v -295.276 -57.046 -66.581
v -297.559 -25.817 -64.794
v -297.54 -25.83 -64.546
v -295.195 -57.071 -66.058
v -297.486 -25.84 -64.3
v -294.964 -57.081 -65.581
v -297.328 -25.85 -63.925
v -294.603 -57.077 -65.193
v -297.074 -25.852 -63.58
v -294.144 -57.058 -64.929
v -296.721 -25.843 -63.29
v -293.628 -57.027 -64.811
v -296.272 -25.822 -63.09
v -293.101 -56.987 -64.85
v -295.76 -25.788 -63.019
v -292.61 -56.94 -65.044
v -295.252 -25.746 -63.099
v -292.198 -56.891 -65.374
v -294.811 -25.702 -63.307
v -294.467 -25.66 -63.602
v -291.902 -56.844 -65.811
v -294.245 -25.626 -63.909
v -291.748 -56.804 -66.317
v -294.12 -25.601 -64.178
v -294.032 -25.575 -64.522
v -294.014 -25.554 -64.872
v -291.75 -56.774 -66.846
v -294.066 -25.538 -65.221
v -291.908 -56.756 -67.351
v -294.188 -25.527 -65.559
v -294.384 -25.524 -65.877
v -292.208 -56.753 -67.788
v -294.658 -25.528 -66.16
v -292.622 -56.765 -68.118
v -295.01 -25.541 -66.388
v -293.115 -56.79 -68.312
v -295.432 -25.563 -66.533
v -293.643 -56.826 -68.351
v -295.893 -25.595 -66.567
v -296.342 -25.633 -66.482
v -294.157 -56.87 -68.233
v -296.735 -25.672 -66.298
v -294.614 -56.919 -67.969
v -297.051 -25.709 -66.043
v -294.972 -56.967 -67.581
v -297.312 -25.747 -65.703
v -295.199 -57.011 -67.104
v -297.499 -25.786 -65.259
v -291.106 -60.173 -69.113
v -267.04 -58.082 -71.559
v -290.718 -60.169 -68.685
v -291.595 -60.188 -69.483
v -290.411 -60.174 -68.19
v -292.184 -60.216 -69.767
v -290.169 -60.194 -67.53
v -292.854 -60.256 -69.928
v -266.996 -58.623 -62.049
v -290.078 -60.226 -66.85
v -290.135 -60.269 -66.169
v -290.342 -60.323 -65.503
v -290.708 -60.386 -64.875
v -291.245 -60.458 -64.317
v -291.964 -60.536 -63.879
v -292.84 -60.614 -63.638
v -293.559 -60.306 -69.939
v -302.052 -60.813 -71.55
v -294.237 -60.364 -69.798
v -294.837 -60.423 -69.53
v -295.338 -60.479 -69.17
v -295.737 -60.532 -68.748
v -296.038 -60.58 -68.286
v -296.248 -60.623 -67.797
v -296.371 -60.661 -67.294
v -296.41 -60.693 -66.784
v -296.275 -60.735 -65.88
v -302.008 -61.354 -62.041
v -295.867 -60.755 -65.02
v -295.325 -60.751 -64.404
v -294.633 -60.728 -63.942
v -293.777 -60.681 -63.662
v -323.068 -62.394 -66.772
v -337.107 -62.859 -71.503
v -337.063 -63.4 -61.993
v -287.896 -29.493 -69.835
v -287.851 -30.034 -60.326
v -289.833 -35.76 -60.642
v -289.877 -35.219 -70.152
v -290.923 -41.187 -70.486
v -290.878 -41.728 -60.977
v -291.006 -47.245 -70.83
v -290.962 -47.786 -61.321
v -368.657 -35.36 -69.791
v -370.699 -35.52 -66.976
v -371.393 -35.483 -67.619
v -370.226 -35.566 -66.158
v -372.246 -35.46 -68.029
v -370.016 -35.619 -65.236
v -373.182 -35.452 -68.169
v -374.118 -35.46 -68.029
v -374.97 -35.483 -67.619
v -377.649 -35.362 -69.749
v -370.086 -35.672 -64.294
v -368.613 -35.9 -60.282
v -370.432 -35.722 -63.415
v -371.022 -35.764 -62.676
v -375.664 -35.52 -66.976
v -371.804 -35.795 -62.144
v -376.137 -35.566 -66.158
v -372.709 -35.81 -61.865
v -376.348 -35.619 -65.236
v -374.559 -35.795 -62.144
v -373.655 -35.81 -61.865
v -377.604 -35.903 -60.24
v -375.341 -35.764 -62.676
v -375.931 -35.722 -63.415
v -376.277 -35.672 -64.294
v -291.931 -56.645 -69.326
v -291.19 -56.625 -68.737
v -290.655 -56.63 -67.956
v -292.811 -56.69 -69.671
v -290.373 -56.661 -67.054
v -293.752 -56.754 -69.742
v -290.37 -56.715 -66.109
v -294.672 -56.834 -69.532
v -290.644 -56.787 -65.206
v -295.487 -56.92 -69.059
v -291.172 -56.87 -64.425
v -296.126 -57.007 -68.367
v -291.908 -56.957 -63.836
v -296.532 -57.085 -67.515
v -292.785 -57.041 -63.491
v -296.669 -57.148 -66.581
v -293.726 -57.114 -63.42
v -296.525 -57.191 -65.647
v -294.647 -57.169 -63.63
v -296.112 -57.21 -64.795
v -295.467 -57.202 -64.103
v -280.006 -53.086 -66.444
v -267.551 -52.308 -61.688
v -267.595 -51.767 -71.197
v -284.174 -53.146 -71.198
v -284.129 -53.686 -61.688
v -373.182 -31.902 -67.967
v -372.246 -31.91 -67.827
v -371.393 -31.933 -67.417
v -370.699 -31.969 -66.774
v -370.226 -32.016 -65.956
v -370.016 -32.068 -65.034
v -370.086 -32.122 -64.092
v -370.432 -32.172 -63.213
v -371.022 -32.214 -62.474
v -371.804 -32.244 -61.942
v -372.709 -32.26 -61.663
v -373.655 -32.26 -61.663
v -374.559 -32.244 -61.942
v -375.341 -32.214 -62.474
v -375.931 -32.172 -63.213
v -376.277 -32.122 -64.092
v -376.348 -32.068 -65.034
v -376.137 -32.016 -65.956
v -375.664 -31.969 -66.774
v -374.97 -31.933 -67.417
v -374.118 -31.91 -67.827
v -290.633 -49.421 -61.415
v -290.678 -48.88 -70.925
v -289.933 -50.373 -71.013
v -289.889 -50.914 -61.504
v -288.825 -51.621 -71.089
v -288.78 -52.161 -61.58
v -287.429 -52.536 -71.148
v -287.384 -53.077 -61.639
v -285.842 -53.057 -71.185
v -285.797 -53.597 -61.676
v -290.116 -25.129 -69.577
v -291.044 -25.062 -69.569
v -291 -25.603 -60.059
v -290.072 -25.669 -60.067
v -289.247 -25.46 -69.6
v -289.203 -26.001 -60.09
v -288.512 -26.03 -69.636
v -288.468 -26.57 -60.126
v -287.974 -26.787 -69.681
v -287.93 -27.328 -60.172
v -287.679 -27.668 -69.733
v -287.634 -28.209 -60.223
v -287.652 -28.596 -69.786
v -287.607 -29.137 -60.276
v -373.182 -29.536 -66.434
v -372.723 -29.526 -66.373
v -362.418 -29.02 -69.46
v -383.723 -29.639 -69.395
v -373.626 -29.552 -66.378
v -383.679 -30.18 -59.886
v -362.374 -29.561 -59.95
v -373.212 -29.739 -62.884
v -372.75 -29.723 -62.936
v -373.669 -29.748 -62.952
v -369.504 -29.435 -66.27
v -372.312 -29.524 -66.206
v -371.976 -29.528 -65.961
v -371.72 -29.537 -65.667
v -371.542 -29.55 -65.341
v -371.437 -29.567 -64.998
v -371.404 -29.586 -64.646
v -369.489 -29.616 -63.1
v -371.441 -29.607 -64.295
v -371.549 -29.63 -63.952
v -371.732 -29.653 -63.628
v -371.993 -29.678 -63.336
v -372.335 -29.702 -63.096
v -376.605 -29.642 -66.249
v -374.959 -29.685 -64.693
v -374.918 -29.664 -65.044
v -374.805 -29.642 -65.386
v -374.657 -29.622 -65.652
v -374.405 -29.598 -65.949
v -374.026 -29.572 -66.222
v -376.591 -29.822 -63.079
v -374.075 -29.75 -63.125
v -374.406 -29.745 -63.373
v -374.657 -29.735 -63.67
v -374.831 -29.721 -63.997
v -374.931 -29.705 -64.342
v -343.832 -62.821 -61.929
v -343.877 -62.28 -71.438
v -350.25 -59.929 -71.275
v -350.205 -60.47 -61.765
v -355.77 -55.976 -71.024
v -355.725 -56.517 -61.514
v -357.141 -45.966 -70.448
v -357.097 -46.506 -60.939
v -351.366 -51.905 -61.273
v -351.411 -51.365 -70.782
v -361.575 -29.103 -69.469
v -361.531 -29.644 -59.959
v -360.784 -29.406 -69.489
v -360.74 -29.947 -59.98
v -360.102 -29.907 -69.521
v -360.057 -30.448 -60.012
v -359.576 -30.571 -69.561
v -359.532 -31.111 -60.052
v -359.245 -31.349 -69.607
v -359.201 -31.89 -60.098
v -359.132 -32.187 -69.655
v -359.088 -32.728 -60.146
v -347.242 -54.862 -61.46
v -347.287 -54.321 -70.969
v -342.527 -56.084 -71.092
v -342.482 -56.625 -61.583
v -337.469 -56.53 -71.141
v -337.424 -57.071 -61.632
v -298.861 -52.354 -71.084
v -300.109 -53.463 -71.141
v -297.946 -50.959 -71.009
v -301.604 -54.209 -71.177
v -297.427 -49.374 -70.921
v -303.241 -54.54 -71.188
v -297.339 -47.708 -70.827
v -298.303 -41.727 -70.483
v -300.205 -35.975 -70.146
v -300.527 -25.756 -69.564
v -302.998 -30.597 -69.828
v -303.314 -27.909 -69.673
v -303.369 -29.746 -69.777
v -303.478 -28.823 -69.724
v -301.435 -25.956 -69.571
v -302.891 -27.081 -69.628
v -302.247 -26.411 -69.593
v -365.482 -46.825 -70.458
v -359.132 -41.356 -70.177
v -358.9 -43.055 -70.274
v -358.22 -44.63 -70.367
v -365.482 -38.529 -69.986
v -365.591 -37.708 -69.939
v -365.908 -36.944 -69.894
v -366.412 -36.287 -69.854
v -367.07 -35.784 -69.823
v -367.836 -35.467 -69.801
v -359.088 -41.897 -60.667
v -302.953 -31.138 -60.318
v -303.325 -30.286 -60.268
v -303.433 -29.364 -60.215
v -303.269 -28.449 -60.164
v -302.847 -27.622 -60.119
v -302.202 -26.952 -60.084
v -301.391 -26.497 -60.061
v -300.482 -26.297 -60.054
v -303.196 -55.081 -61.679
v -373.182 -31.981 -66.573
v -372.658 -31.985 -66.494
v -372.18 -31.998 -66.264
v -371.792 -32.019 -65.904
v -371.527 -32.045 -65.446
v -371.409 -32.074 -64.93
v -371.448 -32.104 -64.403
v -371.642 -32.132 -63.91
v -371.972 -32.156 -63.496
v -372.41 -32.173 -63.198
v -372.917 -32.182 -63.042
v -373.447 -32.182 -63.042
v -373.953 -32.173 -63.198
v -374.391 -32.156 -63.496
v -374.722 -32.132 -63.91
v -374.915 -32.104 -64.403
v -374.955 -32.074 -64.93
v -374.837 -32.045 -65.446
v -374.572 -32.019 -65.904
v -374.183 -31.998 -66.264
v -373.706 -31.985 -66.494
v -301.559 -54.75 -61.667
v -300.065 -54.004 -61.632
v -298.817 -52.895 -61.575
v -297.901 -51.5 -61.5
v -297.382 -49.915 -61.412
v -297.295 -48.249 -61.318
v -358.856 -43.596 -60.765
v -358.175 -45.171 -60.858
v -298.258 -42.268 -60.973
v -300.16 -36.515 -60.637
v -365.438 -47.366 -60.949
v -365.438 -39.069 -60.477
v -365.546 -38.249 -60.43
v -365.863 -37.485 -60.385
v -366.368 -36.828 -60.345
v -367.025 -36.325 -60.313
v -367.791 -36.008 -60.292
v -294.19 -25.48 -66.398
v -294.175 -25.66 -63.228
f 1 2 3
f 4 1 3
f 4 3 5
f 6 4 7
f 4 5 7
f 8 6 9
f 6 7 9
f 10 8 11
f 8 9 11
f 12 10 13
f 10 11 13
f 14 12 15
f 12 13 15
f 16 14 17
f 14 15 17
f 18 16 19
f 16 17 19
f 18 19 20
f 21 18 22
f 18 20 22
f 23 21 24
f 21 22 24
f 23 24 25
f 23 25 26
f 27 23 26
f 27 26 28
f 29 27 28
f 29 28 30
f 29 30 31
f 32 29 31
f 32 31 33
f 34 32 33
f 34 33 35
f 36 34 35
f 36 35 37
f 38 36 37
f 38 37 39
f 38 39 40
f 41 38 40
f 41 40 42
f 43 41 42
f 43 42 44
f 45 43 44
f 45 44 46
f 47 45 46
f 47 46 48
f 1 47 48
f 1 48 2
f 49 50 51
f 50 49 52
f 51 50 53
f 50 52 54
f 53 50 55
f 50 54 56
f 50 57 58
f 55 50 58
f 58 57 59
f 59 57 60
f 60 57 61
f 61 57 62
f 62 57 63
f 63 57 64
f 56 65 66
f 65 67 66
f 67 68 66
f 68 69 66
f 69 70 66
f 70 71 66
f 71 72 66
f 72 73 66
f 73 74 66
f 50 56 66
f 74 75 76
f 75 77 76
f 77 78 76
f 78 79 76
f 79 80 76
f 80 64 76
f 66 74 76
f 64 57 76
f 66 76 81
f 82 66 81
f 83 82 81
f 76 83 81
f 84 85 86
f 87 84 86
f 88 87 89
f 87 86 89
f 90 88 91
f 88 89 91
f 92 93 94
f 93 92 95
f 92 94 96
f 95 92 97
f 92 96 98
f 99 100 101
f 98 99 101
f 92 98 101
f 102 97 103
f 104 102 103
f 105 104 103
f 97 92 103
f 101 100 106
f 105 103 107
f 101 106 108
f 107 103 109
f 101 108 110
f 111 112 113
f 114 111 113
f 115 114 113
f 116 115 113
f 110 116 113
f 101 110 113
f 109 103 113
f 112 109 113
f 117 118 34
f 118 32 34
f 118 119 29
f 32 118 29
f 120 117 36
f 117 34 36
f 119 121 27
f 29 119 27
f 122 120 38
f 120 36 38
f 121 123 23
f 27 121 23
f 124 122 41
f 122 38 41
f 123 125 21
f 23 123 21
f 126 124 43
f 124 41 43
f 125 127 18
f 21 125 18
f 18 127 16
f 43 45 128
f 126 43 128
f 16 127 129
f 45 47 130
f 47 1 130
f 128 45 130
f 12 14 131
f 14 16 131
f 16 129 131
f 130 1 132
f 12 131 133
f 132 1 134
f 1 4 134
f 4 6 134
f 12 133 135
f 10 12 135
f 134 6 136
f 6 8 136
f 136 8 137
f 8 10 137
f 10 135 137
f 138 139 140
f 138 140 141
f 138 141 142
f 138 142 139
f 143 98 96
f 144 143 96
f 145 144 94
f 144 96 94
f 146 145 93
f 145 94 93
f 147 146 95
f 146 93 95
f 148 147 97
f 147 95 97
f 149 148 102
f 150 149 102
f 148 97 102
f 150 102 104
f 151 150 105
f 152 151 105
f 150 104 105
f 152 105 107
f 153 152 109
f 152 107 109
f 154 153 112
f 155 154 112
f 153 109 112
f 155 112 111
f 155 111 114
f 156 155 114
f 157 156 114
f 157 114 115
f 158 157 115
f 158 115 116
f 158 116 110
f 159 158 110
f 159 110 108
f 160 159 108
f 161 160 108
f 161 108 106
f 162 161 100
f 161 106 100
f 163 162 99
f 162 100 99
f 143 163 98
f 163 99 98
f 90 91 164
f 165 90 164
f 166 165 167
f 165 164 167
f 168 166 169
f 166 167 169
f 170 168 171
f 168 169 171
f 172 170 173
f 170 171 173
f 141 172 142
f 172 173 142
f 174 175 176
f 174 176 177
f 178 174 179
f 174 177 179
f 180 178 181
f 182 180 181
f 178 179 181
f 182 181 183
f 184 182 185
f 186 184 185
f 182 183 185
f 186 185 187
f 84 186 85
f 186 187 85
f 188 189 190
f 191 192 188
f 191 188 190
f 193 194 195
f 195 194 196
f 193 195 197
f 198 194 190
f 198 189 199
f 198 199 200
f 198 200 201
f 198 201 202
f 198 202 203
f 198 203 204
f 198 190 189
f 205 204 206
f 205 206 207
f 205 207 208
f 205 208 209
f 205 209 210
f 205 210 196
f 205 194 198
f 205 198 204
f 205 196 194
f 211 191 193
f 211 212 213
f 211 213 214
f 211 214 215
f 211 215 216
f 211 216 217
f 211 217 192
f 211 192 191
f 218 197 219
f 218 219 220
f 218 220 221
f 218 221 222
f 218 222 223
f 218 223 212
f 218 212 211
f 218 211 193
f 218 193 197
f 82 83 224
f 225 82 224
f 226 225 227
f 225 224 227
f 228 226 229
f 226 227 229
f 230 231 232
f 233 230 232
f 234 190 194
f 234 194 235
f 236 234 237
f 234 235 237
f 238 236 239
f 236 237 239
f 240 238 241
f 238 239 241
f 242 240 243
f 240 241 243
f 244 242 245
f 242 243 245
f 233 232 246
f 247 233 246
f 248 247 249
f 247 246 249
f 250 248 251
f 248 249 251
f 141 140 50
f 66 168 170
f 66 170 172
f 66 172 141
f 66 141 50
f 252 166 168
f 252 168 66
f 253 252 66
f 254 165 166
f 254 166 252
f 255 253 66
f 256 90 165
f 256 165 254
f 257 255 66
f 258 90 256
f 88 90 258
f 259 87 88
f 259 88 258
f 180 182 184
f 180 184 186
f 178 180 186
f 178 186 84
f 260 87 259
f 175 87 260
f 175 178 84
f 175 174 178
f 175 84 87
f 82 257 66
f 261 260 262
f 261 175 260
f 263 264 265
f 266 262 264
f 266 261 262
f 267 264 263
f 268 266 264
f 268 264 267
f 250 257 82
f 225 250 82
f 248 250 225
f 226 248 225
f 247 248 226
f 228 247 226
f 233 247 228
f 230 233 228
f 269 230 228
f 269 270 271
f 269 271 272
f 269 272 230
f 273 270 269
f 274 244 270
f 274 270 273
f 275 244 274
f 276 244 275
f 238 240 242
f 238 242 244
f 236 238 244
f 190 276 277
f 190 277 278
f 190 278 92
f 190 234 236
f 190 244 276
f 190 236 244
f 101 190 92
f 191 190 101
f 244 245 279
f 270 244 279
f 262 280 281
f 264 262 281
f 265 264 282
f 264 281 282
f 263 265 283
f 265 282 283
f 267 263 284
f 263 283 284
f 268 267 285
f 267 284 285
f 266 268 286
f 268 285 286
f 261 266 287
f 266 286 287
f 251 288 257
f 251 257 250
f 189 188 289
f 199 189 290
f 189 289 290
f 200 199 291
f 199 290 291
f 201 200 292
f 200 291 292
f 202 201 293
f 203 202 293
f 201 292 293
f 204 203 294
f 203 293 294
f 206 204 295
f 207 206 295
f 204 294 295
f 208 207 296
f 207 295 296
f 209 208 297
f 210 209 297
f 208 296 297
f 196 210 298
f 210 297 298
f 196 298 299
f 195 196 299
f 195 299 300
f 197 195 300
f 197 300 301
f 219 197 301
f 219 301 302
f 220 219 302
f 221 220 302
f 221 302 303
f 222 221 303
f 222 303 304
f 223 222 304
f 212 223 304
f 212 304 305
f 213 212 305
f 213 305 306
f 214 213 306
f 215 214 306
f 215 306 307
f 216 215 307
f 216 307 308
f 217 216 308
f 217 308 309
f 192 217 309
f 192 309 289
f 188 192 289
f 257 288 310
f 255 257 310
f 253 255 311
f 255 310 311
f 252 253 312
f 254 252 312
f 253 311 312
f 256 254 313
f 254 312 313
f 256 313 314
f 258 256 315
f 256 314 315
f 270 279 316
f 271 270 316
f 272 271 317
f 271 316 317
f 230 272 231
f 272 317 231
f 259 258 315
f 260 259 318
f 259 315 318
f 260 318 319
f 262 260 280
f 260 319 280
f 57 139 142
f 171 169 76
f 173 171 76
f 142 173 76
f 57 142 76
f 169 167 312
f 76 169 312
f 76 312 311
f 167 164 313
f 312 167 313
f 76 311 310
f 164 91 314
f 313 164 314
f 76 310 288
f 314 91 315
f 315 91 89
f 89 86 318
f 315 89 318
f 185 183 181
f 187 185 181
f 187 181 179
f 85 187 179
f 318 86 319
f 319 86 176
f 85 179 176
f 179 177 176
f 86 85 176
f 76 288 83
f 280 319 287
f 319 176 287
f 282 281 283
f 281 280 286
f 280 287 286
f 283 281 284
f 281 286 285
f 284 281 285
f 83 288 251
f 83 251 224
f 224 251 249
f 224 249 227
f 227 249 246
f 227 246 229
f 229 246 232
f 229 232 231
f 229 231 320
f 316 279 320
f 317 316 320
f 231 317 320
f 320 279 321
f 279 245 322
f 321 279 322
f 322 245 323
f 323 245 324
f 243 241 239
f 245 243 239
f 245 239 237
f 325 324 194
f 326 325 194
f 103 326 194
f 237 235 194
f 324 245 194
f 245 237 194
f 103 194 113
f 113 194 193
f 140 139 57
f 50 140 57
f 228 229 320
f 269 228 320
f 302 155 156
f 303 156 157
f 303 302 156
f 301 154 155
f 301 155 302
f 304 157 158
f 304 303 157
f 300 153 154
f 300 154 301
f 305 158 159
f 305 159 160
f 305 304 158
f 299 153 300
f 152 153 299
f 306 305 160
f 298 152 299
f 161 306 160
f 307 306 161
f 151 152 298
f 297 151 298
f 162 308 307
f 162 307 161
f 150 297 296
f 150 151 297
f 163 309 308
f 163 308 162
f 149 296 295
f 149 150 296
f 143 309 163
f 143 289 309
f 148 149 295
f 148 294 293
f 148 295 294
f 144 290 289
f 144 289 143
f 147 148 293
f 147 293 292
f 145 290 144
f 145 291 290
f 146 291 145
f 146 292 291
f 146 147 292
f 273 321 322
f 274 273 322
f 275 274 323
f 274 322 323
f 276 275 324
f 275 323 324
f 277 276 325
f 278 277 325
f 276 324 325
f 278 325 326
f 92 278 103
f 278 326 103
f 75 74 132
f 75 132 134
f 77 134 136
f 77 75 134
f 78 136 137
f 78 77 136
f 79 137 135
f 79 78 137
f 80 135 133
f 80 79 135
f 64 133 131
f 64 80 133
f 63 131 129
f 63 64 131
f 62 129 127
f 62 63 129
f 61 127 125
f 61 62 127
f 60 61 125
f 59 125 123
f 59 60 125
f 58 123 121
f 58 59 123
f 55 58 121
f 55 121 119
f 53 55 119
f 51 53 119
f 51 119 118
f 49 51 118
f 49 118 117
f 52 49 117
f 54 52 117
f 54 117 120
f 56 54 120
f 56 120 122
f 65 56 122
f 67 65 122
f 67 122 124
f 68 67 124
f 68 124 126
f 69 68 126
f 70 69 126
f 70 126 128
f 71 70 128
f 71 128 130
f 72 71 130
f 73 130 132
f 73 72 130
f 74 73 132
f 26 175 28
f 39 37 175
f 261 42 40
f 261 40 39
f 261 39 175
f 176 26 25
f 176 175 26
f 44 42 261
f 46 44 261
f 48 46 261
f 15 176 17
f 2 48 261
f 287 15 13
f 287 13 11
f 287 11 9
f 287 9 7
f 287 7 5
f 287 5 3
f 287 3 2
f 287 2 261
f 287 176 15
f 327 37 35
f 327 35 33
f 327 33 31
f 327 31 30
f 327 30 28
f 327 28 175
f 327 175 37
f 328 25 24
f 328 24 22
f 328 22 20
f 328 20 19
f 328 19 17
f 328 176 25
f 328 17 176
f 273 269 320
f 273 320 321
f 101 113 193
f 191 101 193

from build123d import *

# Parameters (mm, degrees)
BOSS_EXTRUDE1_START     = -4.7625
BOSS_EXTRUDE1_DEPTH     = 9.525
SKETCH4_R               = 3.175
CUT_EXTRUDE1_DEPTH      = 3.556
SKETCH5_R               = 1.778
CUT_EXTRUDE2_DEPTH      = 3.556
SKETCH6_R               = 1.778
CUT_EXTRUDE3_DEPTH      = 395.764920194
CUT_EXTRUDE4_DEPTH      = 3.556
CUT_EXTRUDE4_DEPTH_BACK = 394.514669922
SKETCH7_R               = 3.175
SKETCH7_R_2             = 1.778


# Read off the part's stored shape, not the designer's step: Boss-Extrude1
with BuildPart() as part:
    # Boss-Extrude1 outline → Boss-Extrude1 (new body)
    with BuildSketch(Plane(origin=(-0.301955496, 3.66953177, -64.525155836), x_dir=(-0.9999890865713076, -0.0002652643419205306, 0.004664372745720222), z_dir=(-0.004671909489919135, 0.056775652550269534, -0.9983760306313494)).offset(BOSS_EXTRUDE1_START)):
        with BuildLine():
            ThreePointArc((351.090571083, -55.300504742), (344.645589293, -59.305920537), (337.148393987, -60.477760333))
            add(Edge.make_bspline(
                [(302.92001028, -58.493795672), (304.509330321, -58.60122978), (315.913860098, -59.356827376), (327.324538226, -60.002876959), (337.148393987, -60.477760333)],
                knots=[0.283817359, 0.283817359, 0.283817359, 0.283817359, 0.321763123, 0.55608803, 0.55608803, 0.55608803, 0.55608803], degree=3))
            ThreePointArc((302.92001028, -58.493795672), (298.540134178, -56.306049329), (297.01844307, -51.652662937))
            ThreePointArc((297.01844307, -51.652662937), (298.817944258, -42.742557946), (302.676848033, -34.512306606))
            ThreePointArc((302.676848033, -34.512306606), (302.812285866, -31.389489502), (300.205974442, -29.663954561))
            add(Edge.make_bspline(
                [(290.723349608, -28.971987248), (293.88384664, -29.211203734), (297.044721601, -29.441859136), (300.205974442, -29.663954561)],
                knots=[0.169565869, 0.169565869, 0.169565869, 0.169565869, 0.246277706, 0.246277706, 0.246277706, 0.246277706], degree=3))
            ThreePointArc((290.723349608, -28.971987248), (287.894150829, -30.300881632), (287.574810624, -33.410278334))
            ThreePointArc((287.574810624, -33.410278334), (290.198038966, -42.113548005), (290.684983891, -51.190503181))
            ThreePointArc((290.684983891, -51.190503181), (288.503875799, -55.573685628), (283.852803221, -57.102425178))
            add(Edge.make_bspline(
                [(267.2739472, -55.725885072), (271.414101546, -56.089029226), (276.943487963, -56.55461635), (282.47093841, -56.994157025), (283.852803221, -57.102425178)],
                knots=[0, 0, 0, 0, 0.09902591, 0.132034547, 0.132034547, 0.132034547, 0.132034547], degree=3))
            Line((267.2739472, -55.725885072), (266.719101765, -62.051598198))
            add(Edge.make_bspline(
                [(266.719101765, -62.051598198), (285.372886056, -63.687772151), (308.740732669, -65.369335536), (332.113756278, -66.591725825), (336.786834388, -66.817774574)],
                knots=[0, 0, 0, 0, 0.444589519, 0.555671616, 0.555671616, 0.555671616, 0.555671616], degree=3))
            ThreePointArc((336.786834388, -66.817774574), (346.821832777, -65.271443631), (355.449407296, -59.918193219))
            Line((355.449407296, -59.918193219), (365.162167793, -50.749897782))
            Line((365.162167793, -50.749897782), (365.162167793, -42.440188824))
            ThreePointArc((365.162167793, -42.440188824), (366.092103763, -40.195124794), (368.337167793, -39.265188824))
            Line((368.337167793, -39.265188824), (377.328903503, -39.265188824))
            Line((377.328903503, -39.265188824), (383.403102119, -33.531489588))
            add(Edge.make_bspline(
                [(362.097911235, -32.917120768), (369.197743206, -33.164912437), (376.299473684, -33.369697882), (383.403102119, -33.531489588)],
                knots=[0.746516847, 0.746516847, 0.746516847, 0.746516847, 0.918535276, 0.918535276, 0.918535276, 0.918535276], degree=3))
            ThreePointArc((362.097911235, -32.917120768), (359.781604988, -33.806306666), (358.812167793, -36.090188824))
            Line((358.812167793, -36.090188824), (358.812167793, -45.273612359))
            ThreePointArc((358.812167793, -45.273612359), (358.293167277, -47.787960192), (356.821004007, -49.891300836))
            Line((356.821004007, -49.891300836), (351.090571083, -55.300504742))
        make_face()
    extrude(amount=BOSS_EXTRUDE1_DEPTH)

    # Sketch4 → Cut-Extrude1 (cut)
    with BuildSketch(Plane(origin=(4.22e-07, -39.201736636, -2.229324535), x_dir=(-1.0, -1.0737029140643802e-08, -6.106056819647095e-10), z_dir=(1.0754377437384831e-08, -0.9983869264530261, -0.056776272224230304))):
        with Locations(Location((373.181715938, 62.871576923, 0), (0, 0, 90))):
            Circle(SKETCH4_R)
    extrude(amount=-CUT_EXTRUDE1_DEPTH, mode=Mode.SUBTRACT)

    # Sketch5 → Cut-Extrude2 (cut)
    with BuildSketch(Plane(origin=(3.84e-07, -35.651472726, -2.027428111), x_dir=(-1.0, -1.0737029140643802e-08, -6.106056819647096e-10), z_dir=(1.0754377437384831e-08, -0.9983869264530261, -0.0567762722242303))):
        with Locations(Location((373.181715938, 62.871576923, 0), (0, 0, 90))):
            Circle(SKETCH5_R)
    extrude(amount=-CUT_EXTRUDE2_DEPTH, mode=Mode.SUBTRACT)

    # Sketch6 → Cut-Extrude3 (cut, through all)
    with BuildSketch(Plane(origin=(0.563052915, -7.70348677, -0.440716731), x_dir=(0.9973481775659092, 0.07265901361084529, 0.004156975710635213), z_dir=(-0.07277783114339942, 0.995720018948314, 0.05696517497236669))):
        with Locations(Location((-297.136682759, 63.2214344, 0), (0, 0, 180.238565242))):
            Circle(SKETCH6_R)
    extrude(amount=-CUT_EXTRUDE3_DEPTH, mode=Mode.SUBTRACT)

    # Sketch7 → Cut-Extrude4 (cut, two sides: drawn at the far end of the back side and taken through both)
    # profile 1 of 2: a face of its own
    with BuildSketch(Plane(origin=(3.104818668, -42.479008432, -2.430225467), x_dir=(0.9973481775659092, 0.07265901361084529, 0.004156975710635213), z_dir=(-0.07277783114339942, 0.995720018948314, 0.05696517497236669)).offset(-CUT_EXTRUDE4_DEPTH_BACK)):
        with Locations(Location((-297.136682759, 63.2214344, 0), (0, 0, 180.238565242))):
            Circle(SKETCH7_R)
        with Locations(Location((-297.136682759, 63.2214344, 0), (0, 0, 180.238565242))):
            Circle(SKETCH7_R_2, mode=Mode.SUBTRACT)
    # profile 2 of 2: a face of its own
    with BuildSketch(Plane(origin=(3.104818668, -42.479008432, -2.430225467), x_dir=(0.9973481775659092, 0.07265901361084529, 0.004156975710635213), z_dir=(-0.07277783114339942, 0.995720018948314, 0.05696517497236669)).offset(-CUT_EXTRUDE4_DEPTH_BACK)):
        with Locations(Location((-297.136682759, 63.2214344, 0), (0, 0, 180.238565242))):
            Circle(SKETCH7_R_2)
    extrude(amount=CUT_EXTRUDE4_DEPTH + CUT_EXTRUDE4_DEPTH_BACK, mode=Mode.SUBTRACT)


solid = part.part
